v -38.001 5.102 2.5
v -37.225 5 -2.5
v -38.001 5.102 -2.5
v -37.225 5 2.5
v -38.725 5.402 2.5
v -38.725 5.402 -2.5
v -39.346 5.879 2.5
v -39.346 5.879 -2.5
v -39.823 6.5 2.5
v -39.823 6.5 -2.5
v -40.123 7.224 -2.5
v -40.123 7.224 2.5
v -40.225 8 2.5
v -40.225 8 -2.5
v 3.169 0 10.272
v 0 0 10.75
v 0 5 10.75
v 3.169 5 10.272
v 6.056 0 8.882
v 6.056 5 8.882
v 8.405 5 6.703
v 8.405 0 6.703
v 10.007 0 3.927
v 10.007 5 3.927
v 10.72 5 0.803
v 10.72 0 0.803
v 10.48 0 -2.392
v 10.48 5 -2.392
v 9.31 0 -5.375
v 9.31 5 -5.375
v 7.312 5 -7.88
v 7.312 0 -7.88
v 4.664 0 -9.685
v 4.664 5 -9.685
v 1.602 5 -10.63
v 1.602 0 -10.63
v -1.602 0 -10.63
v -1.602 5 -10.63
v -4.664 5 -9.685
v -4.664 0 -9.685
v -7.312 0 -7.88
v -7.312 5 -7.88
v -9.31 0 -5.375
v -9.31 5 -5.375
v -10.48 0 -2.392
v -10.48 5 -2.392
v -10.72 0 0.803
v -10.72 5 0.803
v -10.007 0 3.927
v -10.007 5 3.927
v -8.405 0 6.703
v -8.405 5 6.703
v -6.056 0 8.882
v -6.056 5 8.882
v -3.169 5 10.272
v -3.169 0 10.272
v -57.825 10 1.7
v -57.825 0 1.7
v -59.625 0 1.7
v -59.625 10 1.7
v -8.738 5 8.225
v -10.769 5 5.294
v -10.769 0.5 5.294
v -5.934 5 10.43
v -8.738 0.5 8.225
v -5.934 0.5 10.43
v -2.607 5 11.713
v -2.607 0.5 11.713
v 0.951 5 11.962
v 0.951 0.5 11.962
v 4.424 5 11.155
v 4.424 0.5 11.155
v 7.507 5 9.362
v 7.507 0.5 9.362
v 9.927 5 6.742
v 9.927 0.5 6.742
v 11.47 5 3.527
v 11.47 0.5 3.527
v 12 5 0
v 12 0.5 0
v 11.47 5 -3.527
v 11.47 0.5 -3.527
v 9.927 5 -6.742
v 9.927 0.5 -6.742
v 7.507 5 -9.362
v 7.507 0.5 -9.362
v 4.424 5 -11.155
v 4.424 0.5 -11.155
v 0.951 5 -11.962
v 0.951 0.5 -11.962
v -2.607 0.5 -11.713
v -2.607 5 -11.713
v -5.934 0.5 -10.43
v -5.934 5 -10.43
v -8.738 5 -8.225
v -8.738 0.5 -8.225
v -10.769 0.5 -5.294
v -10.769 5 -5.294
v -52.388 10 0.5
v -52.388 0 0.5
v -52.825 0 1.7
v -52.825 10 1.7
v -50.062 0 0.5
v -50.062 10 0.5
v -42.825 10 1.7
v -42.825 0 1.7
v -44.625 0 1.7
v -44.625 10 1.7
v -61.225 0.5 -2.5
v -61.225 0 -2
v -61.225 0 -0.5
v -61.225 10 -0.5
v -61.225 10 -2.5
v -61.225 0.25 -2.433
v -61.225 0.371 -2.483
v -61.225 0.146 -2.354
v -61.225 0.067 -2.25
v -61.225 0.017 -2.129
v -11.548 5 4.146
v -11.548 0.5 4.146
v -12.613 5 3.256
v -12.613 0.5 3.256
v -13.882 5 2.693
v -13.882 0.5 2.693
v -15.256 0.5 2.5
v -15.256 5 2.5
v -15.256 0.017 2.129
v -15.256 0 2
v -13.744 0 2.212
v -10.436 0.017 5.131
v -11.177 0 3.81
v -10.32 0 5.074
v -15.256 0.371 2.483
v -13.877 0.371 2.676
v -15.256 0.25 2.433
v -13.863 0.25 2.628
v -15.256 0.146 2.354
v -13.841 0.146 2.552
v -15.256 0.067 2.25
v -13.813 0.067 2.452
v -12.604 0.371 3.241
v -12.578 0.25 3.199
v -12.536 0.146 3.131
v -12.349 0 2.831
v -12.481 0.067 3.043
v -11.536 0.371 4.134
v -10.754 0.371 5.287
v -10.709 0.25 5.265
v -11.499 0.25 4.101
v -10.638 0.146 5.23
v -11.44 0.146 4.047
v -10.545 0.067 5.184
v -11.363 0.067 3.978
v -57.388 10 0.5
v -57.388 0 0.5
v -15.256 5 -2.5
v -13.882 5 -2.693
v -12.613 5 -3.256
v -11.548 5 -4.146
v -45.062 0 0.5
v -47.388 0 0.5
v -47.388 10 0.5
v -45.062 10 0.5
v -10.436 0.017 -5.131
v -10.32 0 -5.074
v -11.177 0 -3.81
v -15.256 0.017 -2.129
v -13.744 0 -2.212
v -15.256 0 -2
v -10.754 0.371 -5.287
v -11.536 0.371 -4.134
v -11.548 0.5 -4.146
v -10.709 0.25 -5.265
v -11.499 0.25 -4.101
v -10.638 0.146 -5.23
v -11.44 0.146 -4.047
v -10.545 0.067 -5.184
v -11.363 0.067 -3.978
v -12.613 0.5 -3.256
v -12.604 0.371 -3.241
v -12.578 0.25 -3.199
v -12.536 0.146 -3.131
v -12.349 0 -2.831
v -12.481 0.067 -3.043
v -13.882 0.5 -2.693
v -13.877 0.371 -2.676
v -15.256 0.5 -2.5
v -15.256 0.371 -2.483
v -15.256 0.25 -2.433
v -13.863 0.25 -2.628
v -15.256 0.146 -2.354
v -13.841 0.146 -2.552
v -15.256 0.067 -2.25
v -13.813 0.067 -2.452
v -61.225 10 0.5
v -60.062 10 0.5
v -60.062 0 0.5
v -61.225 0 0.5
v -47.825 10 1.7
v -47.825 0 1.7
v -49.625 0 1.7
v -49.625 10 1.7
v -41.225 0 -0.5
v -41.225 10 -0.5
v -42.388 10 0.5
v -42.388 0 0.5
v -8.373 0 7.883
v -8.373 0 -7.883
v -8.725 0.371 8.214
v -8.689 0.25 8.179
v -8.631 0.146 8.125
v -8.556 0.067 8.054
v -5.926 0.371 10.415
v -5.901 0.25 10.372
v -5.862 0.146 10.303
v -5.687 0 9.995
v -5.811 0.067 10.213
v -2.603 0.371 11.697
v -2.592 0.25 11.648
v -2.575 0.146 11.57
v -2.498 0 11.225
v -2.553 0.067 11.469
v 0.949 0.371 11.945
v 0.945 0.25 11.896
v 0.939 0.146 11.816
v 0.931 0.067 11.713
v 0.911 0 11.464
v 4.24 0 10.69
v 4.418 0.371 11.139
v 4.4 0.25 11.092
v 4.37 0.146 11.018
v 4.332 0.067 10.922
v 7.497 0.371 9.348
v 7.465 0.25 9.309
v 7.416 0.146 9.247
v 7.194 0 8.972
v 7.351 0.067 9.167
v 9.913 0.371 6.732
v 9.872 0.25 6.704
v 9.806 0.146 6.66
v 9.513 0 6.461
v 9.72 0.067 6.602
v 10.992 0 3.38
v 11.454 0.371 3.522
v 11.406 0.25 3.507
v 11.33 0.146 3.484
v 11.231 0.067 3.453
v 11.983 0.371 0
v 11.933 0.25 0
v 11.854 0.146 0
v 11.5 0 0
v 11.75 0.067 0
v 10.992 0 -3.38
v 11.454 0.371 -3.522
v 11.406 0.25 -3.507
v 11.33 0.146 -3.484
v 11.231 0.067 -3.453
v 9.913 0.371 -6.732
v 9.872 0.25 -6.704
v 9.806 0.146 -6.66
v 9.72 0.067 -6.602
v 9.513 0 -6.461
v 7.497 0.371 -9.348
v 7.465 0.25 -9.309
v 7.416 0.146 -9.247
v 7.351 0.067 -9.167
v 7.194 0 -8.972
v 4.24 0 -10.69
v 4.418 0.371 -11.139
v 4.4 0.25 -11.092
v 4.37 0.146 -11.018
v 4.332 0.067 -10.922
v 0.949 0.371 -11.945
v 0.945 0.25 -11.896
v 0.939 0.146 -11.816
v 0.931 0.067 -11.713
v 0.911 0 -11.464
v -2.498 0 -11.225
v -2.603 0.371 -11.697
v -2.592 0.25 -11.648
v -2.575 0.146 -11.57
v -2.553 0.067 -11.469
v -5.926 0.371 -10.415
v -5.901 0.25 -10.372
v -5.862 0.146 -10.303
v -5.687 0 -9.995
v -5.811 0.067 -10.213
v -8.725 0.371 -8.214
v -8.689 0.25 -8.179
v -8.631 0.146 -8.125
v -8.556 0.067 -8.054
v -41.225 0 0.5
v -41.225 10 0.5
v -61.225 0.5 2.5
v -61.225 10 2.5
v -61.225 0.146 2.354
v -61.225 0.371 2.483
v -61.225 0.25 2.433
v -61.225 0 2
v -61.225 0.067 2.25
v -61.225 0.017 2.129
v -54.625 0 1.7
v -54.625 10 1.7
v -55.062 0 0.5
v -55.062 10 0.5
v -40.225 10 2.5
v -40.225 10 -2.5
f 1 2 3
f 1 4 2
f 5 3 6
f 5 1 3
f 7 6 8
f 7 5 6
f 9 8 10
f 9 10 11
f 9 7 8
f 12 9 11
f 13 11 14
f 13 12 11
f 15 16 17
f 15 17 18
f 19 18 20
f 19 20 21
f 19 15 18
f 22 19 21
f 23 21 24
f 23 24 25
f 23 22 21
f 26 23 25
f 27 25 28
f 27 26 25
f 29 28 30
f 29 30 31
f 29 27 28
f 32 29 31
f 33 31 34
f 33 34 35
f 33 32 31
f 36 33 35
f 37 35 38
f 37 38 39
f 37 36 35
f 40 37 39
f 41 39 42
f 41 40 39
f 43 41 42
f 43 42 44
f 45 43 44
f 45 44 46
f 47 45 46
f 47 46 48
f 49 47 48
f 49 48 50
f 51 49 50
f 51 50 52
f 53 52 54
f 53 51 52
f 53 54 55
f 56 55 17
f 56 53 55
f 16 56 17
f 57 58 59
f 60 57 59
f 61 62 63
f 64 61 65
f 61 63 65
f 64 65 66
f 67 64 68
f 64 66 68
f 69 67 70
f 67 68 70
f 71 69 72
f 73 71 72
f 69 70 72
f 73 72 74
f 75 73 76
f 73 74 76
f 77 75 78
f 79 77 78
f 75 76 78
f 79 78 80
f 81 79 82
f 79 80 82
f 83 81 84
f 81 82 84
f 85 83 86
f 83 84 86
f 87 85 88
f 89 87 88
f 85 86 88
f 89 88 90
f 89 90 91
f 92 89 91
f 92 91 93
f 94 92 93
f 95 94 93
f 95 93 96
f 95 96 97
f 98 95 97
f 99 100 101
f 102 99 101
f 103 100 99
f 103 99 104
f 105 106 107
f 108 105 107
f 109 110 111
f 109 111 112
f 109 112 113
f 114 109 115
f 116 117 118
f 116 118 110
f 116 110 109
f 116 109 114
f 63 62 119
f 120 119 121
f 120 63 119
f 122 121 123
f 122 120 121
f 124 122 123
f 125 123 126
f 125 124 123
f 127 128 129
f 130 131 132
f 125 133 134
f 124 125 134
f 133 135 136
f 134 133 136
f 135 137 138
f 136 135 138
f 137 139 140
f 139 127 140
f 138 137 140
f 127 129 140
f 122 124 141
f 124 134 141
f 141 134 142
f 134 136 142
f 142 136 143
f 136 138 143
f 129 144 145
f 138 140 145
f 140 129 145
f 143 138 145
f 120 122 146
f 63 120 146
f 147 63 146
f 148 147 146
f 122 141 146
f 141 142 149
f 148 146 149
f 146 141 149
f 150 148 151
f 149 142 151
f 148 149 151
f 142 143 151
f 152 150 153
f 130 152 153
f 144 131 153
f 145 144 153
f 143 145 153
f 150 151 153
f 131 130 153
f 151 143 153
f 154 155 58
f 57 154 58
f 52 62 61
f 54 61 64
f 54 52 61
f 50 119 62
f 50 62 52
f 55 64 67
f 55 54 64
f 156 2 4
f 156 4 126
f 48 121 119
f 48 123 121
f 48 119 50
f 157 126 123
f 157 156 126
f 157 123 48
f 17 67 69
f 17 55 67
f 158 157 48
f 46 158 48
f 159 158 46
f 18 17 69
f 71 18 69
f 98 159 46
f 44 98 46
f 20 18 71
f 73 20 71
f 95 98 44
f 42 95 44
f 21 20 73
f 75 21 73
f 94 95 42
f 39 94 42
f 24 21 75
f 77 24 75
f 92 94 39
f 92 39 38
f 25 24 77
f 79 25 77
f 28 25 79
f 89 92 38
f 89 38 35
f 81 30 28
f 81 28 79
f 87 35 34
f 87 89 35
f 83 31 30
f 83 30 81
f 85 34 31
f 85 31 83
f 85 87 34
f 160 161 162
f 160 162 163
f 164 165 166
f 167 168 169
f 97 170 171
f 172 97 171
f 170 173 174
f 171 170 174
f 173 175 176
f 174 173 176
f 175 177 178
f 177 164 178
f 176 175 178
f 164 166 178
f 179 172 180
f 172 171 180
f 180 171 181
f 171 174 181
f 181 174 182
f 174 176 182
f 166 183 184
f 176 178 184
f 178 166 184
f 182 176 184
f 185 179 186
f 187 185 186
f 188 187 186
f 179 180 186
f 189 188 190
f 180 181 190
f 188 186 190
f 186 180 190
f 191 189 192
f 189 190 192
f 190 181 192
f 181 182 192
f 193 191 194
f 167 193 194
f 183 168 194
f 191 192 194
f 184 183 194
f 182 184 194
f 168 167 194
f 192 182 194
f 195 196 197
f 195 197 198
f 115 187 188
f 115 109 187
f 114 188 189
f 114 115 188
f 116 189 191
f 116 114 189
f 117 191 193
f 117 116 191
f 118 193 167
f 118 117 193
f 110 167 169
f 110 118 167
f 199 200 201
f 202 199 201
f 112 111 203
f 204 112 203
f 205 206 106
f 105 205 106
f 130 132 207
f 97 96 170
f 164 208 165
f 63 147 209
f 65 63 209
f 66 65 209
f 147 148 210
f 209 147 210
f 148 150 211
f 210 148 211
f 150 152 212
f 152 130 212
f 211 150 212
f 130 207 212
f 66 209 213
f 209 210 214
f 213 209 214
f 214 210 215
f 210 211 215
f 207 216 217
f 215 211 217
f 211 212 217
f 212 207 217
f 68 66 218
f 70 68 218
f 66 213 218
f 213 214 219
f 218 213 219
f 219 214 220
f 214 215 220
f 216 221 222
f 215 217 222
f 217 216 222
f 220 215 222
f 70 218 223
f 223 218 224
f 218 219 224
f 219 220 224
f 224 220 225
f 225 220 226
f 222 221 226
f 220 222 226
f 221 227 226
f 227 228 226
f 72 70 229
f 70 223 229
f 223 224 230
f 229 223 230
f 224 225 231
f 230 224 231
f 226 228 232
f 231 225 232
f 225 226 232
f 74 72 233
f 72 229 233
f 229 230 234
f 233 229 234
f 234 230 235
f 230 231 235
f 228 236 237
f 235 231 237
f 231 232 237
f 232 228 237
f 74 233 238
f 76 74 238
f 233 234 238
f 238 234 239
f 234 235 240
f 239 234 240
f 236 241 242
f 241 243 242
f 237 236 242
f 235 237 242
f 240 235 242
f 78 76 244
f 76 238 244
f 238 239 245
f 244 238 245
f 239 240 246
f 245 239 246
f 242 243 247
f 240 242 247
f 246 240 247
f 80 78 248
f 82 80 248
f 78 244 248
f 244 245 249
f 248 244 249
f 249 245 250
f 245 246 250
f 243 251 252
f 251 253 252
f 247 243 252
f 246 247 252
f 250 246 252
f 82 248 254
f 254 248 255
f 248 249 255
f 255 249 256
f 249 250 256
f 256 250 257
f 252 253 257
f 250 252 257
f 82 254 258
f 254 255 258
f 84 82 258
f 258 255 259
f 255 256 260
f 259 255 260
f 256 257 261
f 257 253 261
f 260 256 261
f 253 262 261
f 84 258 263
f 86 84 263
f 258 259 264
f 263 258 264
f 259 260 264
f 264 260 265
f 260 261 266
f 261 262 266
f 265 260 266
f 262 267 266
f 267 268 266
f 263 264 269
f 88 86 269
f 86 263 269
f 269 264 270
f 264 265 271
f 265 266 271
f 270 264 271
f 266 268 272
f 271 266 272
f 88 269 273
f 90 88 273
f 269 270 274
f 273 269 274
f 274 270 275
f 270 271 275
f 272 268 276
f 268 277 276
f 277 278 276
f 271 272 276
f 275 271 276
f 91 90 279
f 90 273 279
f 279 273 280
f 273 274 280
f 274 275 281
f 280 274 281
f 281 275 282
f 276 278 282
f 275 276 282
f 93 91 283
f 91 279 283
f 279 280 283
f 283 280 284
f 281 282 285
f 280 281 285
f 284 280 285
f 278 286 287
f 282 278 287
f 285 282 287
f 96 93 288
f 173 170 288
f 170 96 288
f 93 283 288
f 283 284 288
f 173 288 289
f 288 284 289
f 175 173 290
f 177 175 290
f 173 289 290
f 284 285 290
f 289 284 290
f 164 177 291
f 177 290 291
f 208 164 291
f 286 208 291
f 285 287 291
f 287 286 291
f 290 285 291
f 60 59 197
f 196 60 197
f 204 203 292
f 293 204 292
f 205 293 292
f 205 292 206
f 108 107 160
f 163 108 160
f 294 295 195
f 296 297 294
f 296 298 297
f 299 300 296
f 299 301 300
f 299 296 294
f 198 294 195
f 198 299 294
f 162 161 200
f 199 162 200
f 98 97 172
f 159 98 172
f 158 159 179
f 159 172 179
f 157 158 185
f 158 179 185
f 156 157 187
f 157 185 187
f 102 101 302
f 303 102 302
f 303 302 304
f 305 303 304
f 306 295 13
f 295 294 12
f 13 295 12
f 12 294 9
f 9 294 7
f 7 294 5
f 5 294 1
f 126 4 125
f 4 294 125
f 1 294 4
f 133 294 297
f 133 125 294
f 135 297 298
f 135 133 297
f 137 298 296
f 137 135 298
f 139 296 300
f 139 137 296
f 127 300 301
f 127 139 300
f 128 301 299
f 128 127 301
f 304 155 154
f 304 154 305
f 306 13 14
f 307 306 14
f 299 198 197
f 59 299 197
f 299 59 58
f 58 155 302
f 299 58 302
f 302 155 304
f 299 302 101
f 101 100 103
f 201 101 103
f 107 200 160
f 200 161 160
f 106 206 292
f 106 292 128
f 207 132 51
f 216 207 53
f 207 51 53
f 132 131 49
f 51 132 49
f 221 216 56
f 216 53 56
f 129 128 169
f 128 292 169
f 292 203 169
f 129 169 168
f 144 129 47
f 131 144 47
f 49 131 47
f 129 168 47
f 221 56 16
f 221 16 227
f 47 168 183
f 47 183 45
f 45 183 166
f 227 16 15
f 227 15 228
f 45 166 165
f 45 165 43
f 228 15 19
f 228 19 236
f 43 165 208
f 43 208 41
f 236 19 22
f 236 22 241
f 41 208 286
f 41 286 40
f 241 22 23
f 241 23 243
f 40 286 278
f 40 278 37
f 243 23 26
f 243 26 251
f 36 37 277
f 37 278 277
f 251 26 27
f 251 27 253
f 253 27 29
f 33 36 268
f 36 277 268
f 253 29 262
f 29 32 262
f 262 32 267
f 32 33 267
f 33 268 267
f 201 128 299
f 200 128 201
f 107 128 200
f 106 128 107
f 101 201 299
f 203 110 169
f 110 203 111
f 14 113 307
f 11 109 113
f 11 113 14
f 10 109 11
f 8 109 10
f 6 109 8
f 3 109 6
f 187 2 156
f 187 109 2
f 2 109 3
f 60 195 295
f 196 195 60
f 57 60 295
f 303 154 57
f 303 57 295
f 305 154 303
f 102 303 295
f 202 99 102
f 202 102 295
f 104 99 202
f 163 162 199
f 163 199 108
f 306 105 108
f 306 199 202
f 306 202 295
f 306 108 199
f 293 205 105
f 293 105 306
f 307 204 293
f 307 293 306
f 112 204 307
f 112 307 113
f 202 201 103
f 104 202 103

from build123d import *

# Parameters (mm, degrees)
SKETCH_1_R               = 12
SKETCH_1_R_2             = 10.75
RING_DEPTH               = 5
SKETCH_2_W               = 50
SKETCH_2_H               = 5
STICK_DEPTH              = 5
SKETCH_3_W               = 21
SKETCH_3_H               = 5
KEY_DEPTH                = 10
FILLET_1_R               = 5
FILLET_5_R               = 3
CUT_EXTRUDE_1_DEPTH      = 63.839058045
CUT_EXTRUDE_1_DEPTH_BACK = 63.839058045
FILLET_7_R               = 0.5


with BuildPart() as part:
    # Эскиз1 → ring (new body)
    with BuildSketch(Plane(origin=(0, 0, 0), x_dir=(1, 0, 0), z_dir=(0, 1, 0))):
        with Locations(Location((0, 0, 0), (0, 0, 270))):
            Circle(SKETCH_1_R)
        with Locations(Location((0, 0, 0), (0, 0, 270))):
            Circle(SKETCH_1_R_2, mode=Mode.SUBTRACT)
    extrude(amount=RING_DEPTH)

    # Эскиз2 → stick (add)
    with BuildSketch(Plane(origin=(0, 0, 0), x_dir=(1, 0, 0), z_dir=(0, 1, 0))):
        with Locations((-36.22497216, 0)):
            Rectangle(SKETCH_2_W, SKETCH_2_H)
    extrude(amount=STICK_DEPTH)

    # Эскиз3 → key (add)
    with BuildSketch(Plane(origin=(0, 0, 0), x_dir=(1, 0, 0), z_dir=(0, 1, 0))):
        with Locations((-50.72497216, 0)):
            Rectangle(SKETCH_3_W, SKETCH_3_H)
    extrude(amount=KEY_DEPTH)

    # Скругление1
    fillet_1_edges = [part.edges().sort_by_distance(p)[0] for p in [
        (-11.736694594, 2.5, 2.5),
        (-11.736694594, 2.5, -2.5),
    ]]
    fillet(fillet_1_edges, radius=FILLET_1_R)

    # Скругление5
    fillet_5_edges = [part.edges().sort_by_distance(p)[0] for p in [
        (-40.22497216, 5, 0),
    ]]
    fillet(fillet_5_edges, radius=FILLET_5_R)

    # Эскиз4 → Вытянуть1 (cut, two sides: drawn at the far end of the back side and taken through both)
    with BuildSketch(Plane(origin=(0, 2.5, 0), x_dir=(1, 0, 0), z_dir=(0, 1, 0)).offset(-CUT_EXTRUDE_1_DEPTH_BACK)):
        Polygon((-61.22497216, 0.5), (-41.22497216, 0.5), (-41.22497216, -0.5), (-42.388207879, -0.5), (-42.82497216, -1.7), (-44.62497216, -1.7), (-45.061736441, -0.5), (-46.22497216, -0.5), (-47.388207879, -0.5), (-47.82497216, -1.7), (-49.62497216, -1.7), (-50.061736441, -0.5), (-51.22497216, -0.5), (-52.388207879, -0.5), (-52.82497216, -1.7), (-54.62497216, -1.7), (-55.061736441, -0.5), (-56.22497216, -0.5), (-57.388207879, -0.5), (-57.82497216, -1.7), (-59.62497216, -1.7), (-60.061736441, -0.5), (-61.22497216, -0.5), align=None)
    extrude(amount=CUT_EXTRUDE_1_DEPTH + CUT_EXTRUDE_1_DEPTH_BACK, mode=Mode.SUBTRACT)

    # Скругление7
    fillet_7_edges = [part.edges().sort_by_distance(p)[0] for p in [
        (-38.240559231, 0, 2.5),
        (12, 0, 0),
        (-38.240559231, 0, -2.5),
        (-12.613175603, 0, 3.255626562),
        (-12.613175603, 0, -3.255626562),
    ]]
    fillet(fillet_7_edges, radius=FILLET_7_R)


solid = part.part
